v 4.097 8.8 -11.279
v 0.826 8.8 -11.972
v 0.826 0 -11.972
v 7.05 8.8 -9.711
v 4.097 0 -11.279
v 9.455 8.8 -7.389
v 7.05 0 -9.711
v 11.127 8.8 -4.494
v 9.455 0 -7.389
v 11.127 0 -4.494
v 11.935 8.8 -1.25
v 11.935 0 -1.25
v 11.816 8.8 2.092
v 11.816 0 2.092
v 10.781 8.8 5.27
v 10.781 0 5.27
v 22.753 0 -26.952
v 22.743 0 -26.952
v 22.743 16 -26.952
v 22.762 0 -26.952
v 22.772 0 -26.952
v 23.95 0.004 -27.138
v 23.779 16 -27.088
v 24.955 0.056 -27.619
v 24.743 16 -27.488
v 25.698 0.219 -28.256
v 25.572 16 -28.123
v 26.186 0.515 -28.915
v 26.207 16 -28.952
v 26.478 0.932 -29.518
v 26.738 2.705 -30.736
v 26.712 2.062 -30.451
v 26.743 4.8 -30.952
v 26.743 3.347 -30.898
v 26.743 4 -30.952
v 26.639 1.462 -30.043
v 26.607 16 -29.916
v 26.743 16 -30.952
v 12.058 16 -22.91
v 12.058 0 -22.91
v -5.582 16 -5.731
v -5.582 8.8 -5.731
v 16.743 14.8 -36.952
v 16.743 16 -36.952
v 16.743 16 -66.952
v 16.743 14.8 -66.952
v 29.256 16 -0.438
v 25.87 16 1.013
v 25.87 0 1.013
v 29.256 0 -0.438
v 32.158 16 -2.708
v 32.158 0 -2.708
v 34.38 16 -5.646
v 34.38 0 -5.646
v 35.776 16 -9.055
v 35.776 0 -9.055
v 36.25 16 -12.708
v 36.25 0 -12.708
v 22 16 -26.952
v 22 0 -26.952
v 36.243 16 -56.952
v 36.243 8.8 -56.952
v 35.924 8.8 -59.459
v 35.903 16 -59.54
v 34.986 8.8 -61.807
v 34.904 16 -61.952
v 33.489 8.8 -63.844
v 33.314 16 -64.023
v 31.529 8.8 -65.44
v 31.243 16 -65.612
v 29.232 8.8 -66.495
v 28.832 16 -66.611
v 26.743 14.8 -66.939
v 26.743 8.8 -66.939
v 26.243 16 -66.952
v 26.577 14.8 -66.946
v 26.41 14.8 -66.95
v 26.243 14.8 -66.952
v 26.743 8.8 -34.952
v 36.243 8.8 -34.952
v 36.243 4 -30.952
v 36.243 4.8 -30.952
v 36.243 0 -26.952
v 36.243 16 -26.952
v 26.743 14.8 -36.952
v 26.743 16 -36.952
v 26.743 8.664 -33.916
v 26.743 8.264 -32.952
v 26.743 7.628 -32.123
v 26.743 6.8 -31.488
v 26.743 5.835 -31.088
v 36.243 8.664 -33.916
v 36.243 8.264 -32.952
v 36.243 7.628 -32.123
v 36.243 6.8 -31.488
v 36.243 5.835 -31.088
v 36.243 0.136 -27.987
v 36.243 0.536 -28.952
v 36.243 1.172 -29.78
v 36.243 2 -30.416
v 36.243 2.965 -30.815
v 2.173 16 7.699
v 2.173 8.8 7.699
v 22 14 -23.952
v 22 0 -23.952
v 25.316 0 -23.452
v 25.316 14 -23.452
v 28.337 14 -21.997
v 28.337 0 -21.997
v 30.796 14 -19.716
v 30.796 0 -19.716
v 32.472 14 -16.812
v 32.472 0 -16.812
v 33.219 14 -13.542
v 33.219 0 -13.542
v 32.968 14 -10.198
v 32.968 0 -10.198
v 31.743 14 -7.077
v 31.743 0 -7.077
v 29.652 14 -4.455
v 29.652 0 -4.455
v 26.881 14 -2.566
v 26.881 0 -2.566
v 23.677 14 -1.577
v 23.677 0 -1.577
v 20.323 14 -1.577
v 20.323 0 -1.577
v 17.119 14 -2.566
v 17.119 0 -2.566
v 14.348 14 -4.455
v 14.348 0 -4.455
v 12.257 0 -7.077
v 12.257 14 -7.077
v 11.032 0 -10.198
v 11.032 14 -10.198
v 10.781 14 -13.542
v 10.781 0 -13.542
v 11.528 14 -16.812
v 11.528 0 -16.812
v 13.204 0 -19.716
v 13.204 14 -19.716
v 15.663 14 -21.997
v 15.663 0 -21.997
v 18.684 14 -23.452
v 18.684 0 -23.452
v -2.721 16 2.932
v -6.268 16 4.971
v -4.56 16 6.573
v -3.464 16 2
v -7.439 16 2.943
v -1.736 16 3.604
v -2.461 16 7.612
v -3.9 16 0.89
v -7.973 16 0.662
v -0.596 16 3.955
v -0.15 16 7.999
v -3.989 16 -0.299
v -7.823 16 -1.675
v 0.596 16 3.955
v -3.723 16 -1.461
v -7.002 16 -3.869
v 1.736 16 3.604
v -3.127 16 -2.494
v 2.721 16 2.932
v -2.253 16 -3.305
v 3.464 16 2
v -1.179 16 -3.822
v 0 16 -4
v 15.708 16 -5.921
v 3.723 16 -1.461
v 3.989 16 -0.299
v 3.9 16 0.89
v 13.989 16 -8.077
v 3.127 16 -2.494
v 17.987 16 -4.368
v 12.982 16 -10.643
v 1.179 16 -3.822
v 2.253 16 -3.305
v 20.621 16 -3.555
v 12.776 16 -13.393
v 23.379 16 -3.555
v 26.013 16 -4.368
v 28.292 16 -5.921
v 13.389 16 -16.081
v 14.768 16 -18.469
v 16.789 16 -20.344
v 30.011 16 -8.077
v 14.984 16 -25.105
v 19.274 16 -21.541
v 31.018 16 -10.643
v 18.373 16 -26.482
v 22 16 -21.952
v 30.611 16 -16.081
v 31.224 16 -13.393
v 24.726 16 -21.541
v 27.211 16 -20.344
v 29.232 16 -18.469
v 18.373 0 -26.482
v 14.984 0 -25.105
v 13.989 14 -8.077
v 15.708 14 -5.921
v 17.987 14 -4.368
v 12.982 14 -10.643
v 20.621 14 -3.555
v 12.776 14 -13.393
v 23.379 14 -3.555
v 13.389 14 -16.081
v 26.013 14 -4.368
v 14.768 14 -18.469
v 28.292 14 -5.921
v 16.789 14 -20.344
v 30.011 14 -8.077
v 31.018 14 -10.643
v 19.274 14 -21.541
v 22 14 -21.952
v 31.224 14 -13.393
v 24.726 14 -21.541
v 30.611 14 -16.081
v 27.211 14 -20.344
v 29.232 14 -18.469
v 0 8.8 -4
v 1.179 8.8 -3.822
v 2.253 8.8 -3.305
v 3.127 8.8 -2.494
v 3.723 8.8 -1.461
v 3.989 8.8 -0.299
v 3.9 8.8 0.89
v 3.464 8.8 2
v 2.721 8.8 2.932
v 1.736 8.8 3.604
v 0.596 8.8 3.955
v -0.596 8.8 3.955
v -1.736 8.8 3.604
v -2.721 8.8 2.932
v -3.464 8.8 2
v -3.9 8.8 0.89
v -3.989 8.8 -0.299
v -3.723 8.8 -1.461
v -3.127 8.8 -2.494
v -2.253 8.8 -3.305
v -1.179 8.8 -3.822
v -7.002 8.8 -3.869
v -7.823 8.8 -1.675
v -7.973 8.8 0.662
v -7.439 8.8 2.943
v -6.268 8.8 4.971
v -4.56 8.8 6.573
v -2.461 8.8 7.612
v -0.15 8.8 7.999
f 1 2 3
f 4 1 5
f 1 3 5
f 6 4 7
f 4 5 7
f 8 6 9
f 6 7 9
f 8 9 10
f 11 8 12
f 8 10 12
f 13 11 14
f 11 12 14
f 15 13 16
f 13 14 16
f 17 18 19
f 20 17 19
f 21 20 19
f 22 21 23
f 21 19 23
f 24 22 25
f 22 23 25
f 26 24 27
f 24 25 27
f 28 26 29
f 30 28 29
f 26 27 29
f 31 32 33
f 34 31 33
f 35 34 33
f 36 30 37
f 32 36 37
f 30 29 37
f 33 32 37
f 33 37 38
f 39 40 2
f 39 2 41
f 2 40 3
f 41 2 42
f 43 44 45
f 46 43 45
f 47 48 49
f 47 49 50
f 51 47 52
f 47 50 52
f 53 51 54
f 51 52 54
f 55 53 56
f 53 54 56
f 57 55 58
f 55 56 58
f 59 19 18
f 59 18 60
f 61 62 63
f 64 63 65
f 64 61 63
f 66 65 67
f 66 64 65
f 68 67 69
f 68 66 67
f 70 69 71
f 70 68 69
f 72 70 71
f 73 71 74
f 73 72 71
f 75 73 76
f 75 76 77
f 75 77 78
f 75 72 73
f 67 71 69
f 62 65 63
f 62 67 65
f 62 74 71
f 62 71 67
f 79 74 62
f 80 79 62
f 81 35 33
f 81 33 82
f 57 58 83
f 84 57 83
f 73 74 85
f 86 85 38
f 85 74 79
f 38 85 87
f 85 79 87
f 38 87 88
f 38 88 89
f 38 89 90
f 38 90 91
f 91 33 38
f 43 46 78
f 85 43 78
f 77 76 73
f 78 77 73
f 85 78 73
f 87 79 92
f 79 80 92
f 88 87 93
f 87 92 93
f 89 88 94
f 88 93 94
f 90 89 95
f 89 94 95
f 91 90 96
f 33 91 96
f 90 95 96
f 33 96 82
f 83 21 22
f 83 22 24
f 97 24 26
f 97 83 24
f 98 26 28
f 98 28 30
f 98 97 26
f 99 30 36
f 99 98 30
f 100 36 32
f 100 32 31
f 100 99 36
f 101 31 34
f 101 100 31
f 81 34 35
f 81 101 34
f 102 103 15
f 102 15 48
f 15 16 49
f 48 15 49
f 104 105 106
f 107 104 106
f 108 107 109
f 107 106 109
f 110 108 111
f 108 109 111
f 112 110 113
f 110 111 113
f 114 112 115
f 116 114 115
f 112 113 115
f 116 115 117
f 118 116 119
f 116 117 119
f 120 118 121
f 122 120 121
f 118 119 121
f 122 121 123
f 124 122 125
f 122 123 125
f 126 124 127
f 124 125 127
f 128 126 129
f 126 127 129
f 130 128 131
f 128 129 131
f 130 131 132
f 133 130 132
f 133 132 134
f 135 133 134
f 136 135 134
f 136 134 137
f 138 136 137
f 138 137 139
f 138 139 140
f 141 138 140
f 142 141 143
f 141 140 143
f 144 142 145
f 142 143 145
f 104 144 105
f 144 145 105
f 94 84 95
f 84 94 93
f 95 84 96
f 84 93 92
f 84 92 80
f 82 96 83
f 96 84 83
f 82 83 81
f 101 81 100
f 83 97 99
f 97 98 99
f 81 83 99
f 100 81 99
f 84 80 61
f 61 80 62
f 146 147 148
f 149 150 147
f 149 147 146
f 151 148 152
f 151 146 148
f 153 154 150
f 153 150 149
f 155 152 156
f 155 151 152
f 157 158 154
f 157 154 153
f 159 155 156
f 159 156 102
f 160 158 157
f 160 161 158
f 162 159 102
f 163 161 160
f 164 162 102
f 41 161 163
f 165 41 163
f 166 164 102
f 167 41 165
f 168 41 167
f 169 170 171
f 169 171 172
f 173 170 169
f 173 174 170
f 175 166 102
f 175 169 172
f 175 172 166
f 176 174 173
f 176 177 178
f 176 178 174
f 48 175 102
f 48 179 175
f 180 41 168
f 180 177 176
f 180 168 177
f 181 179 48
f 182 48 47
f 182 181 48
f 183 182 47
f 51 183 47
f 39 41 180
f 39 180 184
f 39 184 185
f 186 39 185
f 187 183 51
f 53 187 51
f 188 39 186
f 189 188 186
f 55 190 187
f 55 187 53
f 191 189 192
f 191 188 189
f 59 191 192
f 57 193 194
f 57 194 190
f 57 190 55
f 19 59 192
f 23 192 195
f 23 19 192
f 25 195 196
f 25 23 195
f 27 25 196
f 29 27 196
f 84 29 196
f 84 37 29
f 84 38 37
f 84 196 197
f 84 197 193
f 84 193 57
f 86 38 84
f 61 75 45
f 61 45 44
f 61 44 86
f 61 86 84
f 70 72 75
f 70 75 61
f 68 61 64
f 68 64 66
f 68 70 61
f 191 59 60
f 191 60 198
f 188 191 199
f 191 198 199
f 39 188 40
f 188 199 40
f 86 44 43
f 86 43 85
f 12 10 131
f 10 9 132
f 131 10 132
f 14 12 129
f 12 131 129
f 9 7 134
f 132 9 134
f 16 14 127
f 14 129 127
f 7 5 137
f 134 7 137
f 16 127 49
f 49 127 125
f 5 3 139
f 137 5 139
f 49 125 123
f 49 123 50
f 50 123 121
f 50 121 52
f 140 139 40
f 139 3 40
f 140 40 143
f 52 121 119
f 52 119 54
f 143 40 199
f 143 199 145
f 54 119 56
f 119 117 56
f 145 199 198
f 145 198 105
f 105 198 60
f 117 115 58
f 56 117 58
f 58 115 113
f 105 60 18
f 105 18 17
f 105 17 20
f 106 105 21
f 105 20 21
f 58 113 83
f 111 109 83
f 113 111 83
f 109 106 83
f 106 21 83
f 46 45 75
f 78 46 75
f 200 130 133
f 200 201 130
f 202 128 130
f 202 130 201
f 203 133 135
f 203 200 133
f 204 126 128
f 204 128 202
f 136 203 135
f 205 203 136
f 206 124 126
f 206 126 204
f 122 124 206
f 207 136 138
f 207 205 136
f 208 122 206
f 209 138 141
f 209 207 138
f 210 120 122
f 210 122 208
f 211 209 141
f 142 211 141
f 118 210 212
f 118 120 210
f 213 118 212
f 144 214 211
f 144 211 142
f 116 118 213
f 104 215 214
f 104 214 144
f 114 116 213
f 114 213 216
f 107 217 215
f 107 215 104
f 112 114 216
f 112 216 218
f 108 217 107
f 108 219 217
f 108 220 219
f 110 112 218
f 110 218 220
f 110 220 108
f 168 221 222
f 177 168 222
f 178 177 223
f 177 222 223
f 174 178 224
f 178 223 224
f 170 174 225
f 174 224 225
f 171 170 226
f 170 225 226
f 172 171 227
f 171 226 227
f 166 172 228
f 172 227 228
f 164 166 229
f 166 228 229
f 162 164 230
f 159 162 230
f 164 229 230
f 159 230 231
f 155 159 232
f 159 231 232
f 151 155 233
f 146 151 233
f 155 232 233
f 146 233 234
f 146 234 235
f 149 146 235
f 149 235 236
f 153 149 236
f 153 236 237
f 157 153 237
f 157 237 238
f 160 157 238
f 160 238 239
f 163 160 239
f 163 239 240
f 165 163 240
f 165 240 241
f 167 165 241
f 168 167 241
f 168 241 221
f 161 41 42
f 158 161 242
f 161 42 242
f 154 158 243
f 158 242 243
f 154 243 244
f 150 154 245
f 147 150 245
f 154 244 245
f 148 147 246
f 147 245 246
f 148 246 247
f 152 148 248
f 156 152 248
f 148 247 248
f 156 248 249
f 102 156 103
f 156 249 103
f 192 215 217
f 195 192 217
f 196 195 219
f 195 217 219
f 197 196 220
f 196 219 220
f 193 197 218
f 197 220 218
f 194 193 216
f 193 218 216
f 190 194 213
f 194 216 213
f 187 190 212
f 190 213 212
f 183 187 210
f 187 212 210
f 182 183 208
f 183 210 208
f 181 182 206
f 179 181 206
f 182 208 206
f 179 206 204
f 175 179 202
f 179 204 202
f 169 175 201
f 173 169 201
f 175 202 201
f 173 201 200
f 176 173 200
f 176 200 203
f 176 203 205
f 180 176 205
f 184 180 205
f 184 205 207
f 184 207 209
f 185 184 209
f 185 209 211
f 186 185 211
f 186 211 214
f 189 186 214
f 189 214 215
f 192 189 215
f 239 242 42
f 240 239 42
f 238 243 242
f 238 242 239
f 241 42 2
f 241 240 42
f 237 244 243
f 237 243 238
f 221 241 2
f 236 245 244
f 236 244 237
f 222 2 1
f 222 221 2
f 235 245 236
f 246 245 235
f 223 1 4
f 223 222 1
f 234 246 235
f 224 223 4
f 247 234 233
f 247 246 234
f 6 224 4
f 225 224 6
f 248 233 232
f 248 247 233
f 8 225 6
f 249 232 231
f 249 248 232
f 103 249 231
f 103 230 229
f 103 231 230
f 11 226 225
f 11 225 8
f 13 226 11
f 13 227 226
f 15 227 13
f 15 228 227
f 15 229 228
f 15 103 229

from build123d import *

# Parameters (mm, degrees)
BOSS_EXTRUDE1_DEPTH = 16
SKETCH13_R          = 11.25
CUT_EXTRUDE5_DEPTH  = 14
SKETCH14_R          = 12
CUT_EXTRUDE6_DEPTH  = 8.8
SKETCH15_R          = 9.25
CUT_EXTRUDE7_DEPTH  = 78.41184293
SKETCH17_R          = 4
CUT_EXTRUDE8_DEPTH  = 77.64224309
FILLET1_R           = 4
SKETCH18_W          = 10
SKETCH18_H          = 30
BOSS_EXTRUDE2_DEPTH = 1.2
SKETCH19_W          = 9.5
SKETCH19_H          = 36
CUT_EXTRUDE9_DEPTH  = 8.8
FILLET2_R           = 4
FILLET3_R           = 10


with BuildPart() as part:
    # Sketch2 → Boss-Extrude1 (new body)
    with BuildSketch(Plane(origin=(0, 0, 0), x_dir=(1, 0, 0), z_dir=(0, 1, 0))):
        with BuildLine():
            Line((26.74332389, 26.951705922), (22, 26.951705922))
            ThreePointArc((22, 26.951705922), (16.633883839, 25.902739872), (12.057785035, 22.91027397))
            Line((12.057785035, 22.91027397), (-5.581594366, 5.731125922))
            ThreePointArc((-5.581594366, 5.731125922), (-6.92820323, -4), (2.172503457, -7.699365476))
            Line((2.172503457, -7.699365476), (25.869771783, -1.012788831))
            ThreePointArc((25.869771783, -1.012788831), (33.364381258, 4.104419222), (36.249998435, 12.708383596))
            Line((36.249998435, 12.708383596), (36.24332389, 26.951705922))
            Line((36.24332389, 26.951705922), (36.24332389, 66.951705922))
            Line((36.24332389, 66.951705922), (26.74332389, 66.951705922))
            Line((26.74332389, 66.951705922), (26.74332389, 26.951705922))
        make_face()
    extrude(amount=BOSS_EXTRUDE1_DEPTH)

    # Sketch13 → Cut-Extrude5 (cut)
    with BuildSketch(Plane.XZ):
        with Locations(Location((22, -12.701705922, 0), (0, 0, 270))):
            Circle(SKETCH13_R)
    extrude(amount=-CUT_EXTRUDE5_DEPTH, mode=Mode.SUBTRACT)

    # Sketch14 → Cut-Extrude6 (cut)
    with BuildSketch(Plane.XZ):
        Circle(SKETCH14_R)
    extrude(amount=-CUT_EXTRUDE6_DEPTH, mode=Mode.SUBTRACT)

    # Sketch15 → Cut-Extrude7 (cut, through all)
    with BuildSketch(Plane.XZ.offset(-14)):
        with Locations(Location((22, -12.701705922, 0), (0, 0, 270))):
            Circle(SKETCH15_R)
    extrude(amount=-CUT_EXTRUDE7_DEPTH, mode=Mode.SUBTRACT)

    # Sketch17 → Cut-Extrude8 (cut, through all)
    with BuildSketch(Plane.XZ.offset(-8.8)):
        with Locations(Location((0, 0, 0), (0, 0, 270))):
            Circle(SKETCH17_R)
    extrude(amount=-CUT_EXTRUDE8_DEPTH, mode=Mode.SUBTRACT)

    # Fillet1
    fillet1_edges = [part.edges().sort_by_distance(p)[0] for p in [
        (26.74332389, 8, -26.951705922),
    ]]
    fillet(fillet1_edges, radius=FILLET1_R)

    # Sketch18 → Boss-Extrude2 (add)
    with BuildSketch(Plane(origin=(0, 16, 0), x_dir=(1, 0, 0), z_dir=(0, 1, 0))):
        with Locations((21.74332389, 51.951705922)):
            Rectangle(SKETCH18_W, SKETCH18_H)
    extrude(amount=-BOSS_EXTRUDE2_DEPTH)

    # Sketch19 → Cut-Extrude9 (cut)
    with BuildSketch(Plane.XZ):
        with Locations((31.49332389, -48.951705922)):
            Rectangle(SKETCH19_W, SKETCH19_H)
    extrude(amount=-CUT_EXTRUDE9_DEPTH, mode=Mode.SUBTRACT)

    # Fillet2
    fillet2_edges = [part.edges().sort_by_distance(p)[0] for p in [
        (31.49332389, 0, -30.951705922),
        (31.49332389, 8.8, -30.951705922),
    ]]
    fillet(fillet2_edges, radius=FILLET2_R - 0.0001)  # a hair under: the kernel refuses the full size

    # Fillet3
    fillet3_edges = [part.edges().sort_by_distance(p)[0] for p in [
        (36.24332389, 12.4, -66.951705922),
    ]]
    fillet(fillet3_edges, radius=FILLET3_R)


solid = part.part
